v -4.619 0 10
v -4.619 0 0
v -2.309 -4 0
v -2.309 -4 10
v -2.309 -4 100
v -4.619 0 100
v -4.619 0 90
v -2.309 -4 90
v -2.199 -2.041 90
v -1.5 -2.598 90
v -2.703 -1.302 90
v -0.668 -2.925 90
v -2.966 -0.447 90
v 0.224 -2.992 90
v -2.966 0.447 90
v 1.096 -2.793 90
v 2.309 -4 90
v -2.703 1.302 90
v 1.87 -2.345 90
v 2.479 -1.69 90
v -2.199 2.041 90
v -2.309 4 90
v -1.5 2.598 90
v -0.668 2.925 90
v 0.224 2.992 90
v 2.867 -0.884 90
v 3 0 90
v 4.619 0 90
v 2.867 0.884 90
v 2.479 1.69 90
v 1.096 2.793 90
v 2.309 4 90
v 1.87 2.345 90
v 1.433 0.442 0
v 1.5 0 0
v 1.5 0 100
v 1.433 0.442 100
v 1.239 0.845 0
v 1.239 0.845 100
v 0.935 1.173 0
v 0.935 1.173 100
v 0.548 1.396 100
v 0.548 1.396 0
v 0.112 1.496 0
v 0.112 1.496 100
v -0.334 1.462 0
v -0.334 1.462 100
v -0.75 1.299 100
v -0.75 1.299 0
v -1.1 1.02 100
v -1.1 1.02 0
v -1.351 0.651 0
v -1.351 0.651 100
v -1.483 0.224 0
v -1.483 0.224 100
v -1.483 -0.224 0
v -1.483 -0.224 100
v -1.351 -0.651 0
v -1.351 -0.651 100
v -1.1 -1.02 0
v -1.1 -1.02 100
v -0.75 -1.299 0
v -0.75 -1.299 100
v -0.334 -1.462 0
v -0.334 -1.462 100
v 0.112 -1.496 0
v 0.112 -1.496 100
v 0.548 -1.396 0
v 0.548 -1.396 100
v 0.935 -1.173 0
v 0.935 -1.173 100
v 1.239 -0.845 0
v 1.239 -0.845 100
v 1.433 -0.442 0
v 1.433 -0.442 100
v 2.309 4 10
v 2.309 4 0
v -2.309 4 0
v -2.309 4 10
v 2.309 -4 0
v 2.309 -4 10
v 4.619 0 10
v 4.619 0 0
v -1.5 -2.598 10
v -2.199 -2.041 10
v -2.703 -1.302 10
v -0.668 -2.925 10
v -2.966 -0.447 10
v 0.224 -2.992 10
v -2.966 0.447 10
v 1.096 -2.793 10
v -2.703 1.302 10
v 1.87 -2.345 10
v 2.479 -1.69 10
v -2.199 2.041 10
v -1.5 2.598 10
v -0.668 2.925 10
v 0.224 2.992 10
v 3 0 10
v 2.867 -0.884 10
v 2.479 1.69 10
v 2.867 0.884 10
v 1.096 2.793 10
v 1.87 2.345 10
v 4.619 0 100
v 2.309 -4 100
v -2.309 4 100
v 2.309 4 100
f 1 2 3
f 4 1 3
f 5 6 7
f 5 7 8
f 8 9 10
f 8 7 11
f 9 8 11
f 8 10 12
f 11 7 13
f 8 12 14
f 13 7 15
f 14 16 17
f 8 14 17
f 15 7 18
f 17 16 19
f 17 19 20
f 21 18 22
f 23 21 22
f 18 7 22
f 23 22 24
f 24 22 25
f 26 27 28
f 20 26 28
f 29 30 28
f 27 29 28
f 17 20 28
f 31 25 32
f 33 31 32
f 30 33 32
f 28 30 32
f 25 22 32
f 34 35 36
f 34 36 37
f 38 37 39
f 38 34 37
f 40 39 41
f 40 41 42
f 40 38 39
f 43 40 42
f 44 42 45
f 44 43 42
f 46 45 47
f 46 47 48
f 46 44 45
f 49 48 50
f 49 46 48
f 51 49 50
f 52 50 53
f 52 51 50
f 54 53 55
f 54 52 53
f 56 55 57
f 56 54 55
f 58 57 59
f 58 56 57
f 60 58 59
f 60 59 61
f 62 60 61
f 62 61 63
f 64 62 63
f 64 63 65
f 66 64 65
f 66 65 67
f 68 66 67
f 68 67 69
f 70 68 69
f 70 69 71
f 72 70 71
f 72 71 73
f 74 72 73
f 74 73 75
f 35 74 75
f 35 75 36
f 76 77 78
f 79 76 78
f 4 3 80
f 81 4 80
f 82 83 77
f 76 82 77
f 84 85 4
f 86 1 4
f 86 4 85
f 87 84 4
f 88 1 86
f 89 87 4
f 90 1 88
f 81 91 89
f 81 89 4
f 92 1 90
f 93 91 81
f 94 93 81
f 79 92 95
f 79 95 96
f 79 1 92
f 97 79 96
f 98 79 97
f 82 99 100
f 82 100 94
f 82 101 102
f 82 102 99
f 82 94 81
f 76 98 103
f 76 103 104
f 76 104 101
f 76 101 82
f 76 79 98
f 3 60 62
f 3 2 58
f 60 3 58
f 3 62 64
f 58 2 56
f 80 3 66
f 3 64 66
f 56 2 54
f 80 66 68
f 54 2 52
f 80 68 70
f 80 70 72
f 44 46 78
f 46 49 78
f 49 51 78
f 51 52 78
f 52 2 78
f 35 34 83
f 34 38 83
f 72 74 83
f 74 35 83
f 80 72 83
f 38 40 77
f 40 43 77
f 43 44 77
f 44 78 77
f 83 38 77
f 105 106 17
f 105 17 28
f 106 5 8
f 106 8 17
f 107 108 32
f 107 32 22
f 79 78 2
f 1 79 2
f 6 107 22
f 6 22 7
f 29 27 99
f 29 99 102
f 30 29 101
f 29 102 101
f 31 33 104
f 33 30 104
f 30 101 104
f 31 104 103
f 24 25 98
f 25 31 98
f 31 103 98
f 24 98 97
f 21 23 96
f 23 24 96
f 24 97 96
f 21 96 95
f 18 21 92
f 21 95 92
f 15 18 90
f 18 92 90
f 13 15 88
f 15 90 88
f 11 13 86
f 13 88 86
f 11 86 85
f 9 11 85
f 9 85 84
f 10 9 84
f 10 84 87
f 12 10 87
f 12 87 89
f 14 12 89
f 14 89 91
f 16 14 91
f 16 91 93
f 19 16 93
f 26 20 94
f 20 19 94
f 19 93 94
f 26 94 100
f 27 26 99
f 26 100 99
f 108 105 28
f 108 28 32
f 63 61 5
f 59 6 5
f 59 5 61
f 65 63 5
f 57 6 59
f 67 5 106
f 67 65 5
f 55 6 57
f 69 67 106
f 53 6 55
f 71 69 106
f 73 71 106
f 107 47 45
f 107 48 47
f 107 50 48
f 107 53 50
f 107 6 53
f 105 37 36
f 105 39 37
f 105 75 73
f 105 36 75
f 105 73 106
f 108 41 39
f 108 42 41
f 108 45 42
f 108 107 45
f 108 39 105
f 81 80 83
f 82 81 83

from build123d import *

# Parameters (mm, degrees)
SKETCH1_R           = 3
SKETCH1_R_2         = 1.5
BOSS_EXTRUDE1_DEPTH = 100
SKETCH2_R           = 1.5
BOSS_EXTRUDE2_DEPTH = 10


with BuildPart() as part:
    # Sketch1 → Boss-Extrude1 (new body)
    with BuildSketch(Plane.XY):
        Circle(SKETCH1_R)
        Circle(SKETCH1_R_2, mode=Mode.SUBTRACT)
    extrude(amount=BOSS_EXTRUDE1_DEPTH)

    # Sketch2 → Boss-Extrude2 (add)
    with BuildSketch(Plane.XY.offset(100)):
        Polygon((4.618802154, 0), (2.309401077, 4), (-2.309401077, 4), (-4.618802154, 0), (-2.309401077, -4), (2.309401077, -4), align=None)
        Circle(SKETCH2_R, mode=Mode.SUBTRACT)
    boss_extrude2 = extrude(amount=-BOSS_EXTRUDE2_DEPTH)

    # Mirror1: Boss-Extrude2 across plane
    add(boss_extrude2.mirror(Plane.XY.offset(50)))


solid = part.part
